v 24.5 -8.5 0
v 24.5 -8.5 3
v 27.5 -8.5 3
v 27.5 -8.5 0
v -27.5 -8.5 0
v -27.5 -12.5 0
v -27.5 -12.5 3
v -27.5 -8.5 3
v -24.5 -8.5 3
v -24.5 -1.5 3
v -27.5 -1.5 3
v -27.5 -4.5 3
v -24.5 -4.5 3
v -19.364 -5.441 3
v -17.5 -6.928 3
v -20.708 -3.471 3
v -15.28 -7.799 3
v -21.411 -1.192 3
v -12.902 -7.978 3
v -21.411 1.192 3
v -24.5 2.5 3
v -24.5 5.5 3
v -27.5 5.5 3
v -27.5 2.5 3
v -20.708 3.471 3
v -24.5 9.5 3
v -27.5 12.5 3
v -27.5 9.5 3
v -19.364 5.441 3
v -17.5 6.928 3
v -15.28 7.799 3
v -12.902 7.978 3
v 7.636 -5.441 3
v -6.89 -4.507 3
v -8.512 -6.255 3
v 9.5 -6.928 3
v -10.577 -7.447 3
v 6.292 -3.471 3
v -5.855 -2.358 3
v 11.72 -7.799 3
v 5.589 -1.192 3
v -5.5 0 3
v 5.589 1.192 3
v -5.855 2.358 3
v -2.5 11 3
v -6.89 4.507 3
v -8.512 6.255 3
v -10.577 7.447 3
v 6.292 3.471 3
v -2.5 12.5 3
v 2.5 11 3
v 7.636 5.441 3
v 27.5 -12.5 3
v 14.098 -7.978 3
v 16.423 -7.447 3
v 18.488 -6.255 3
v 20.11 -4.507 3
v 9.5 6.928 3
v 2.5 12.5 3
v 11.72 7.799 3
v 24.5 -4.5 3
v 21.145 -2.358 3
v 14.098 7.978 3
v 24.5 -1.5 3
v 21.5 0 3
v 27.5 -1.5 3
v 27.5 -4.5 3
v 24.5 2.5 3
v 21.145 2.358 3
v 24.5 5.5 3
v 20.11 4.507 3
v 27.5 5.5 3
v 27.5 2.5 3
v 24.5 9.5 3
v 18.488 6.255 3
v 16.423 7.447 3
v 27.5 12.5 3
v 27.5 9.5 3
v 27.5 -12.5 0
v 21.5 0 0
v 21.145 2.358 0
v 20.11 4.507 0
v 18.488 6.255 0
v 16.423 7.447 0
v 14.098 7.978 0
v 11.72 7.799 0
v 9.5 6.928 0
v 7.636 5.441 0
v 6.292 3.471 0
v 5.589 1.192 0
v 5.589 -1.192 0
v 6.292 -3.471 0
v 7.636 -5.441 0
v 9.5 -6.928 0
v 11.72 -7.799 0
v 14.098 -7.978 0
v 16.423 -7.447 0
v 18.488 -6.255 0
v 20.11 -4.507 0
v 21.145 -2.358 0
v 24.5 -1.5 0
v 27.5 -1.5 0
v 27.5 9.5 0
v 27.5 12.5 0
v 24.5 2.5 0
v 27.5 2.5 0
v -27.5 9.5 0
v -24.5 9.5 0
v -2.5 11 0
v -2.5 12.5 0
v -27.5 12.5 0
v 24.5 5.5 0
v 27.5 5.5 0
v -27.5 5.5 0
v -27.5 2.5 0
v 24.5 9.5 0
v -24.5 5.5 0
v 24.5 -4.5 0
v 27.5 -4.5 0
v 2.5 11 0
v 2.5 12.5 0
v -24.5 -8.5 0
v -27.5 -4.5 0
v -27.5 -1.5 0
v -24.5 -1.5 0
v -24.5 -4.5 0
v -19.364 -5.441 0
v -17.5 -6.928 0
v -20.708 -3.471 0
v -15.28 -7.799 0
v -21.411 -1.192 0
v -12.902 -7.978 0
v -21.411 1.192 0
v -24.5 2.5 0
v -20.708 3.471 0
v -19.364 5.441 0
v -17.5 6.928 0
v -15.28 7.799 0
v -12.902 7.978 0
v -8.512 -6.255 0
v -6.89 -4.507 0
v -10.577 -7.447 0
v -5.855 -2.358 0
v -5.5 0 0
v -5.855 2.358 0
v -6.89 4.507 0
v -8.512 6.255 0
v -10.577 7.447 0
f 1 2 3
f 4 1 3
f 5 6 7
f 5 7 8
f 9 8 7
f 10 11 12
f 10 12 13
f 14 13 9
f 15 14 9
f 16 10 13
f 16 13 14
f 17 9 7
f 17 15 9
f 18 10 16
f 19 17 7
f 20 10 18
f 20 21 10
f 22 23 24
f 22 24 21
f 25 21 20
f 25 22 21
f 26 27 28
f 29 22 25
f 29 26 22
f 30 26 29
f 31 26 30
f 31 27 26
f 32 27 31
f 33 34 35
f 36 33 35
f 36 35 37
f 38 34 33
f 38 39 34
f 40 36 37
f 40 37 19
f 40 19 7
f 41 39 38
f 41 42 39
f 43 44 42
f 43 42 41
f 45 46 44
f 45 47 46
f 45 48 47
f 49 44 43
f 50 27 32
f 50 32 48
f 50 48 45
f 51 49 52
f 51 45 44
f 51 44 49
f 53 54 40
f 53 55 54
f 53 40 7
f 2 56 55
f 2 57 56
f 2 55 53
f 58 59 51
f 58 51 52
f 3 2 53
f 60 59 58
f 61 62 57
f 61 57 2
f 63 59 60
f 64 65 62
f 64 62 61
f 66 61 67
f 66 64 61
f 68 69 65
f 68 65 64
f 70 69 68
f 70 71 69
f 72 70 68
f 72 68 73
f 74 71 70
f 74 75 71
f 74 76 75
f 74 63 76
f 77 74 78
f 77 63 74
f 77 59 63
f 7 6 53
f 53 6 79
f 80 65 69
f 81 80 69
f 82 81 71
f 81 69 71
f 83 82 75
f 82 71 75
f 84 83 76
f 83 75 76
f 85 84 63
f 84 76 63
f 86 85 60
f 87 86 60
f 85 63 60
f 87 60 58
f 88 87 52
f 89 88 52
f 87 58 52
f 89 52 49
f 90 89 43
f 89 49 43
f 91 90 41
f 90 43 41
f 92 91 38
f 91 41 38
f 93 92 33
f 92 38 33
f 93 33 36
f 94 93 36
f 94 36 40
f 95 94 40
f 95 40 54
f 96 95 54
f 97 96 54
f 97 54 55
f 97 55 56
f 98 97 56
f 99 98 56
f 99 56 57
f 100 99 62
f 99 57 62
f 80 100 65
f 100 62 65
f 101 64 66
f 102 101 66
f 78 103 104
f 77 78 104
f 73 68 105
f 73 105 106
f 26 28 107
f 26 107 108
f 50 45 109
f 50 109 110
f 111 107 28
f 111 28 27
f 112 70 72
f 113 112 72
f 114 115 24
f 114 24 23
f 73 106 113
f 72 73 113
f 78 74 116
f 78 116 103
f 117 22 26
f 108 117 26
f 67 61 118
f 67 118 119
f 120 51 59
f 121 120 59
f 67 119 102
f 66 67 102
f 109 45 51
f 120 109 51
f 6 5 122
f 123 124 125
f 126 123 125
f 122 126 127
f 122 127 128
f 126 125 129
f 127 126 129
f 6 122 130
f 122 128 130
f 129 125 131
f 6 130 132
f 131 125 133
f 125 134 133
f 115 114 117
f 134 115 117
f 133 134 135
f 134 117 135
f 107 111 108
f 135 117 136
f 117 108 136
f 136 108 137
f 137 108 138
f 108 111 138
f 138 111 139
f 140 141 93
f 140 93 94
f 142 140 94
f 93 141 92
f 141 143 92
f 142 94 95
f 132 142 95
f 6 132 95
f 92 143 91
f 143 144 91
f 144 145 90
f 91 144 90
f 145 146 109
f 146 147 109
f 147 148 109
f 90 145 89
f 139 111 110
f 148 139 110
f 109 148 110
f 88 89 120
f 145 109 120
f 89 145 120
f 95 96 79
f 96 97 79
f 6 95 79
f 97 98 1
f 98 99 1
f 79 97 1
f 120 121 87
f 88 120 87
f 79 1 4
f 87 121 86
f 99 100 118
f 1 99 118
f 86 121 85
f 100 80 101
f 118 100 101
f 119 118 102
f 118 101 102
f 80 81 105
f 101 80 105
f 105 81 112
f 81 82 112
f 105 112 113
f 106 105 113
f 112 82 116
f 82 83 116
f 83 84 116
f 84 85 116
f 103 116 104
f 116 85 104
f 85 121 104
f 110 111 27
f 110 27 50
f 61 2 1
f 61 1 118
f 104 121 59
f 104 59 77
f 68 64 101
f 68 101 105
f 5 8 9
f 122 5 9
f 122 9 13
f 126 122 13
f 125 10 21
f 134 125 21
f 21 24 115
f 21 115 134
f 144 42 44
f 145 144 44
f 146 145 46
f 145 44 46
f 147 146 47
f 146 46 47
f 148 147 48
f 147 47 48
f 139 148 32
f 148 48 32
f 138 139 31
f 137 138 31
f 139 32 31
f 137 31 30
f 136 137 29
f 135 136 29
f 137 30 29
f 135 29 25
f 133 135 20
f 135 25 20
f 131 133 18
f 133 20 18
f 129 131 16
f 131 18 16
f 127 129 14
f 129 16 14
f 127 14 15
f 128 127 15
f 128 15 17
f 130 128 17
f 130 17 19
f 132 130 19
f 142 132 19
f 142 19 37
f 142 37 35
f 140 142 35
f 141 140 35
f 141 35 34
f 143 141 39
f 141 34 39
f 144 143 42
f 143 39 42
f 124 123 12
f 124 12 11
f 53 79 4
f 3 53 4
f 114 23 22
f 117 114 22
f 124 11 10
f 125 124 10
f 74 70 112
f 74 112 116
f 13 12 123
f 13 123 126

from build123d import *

# Parameters (mm, degrees)
SKETCH1_W           = 55
SKETCH1_H           = 25
BOSS_EXTRUDE1_DEPTH = 3
SKETCH2_R           = 8
CUT_EXTRUDE1_DEPTH  = 3
SKETCH3_W           = 3
SKETCH3_H           = 4
CUT_EXTRUDE2_DEPTH  = 3
SKETCH4_W           = 3
SKETCH4_H           = 4
CUT_EXTRUDE3_DEPTH  = 3
SKETCH5_W           = 5
SKETCH5_H           = 1.5
CUT_EXTRUDE4_DEPTH  = 10


with BuildPart() as part:
    # Sketch1 → Boss-Extrude1 (new body)
    with BuildSketch(Plane.XY):
        Rectangle(SKETCH1_W, SKETCH1_H)
    extrude(amount=BOSS_EXTRUDE1_DEPTH)

    # Sketch2 → Cut-Extrude1 (cut)
    with BuildSketch(Plane.XY.offset(3)):
        with Locations((-13.5, 0)):
            Circle(SKETCH2_R)
        with Locations((13.5, 0)):
            Circle(SKETCH2_R)
    extrude(amount=-CUT_EXTRUDE1_DEPTH, mode=Mode.SUBTRACT)

    # Sketch3 → Cut-Extrude2 (cut)
    with BuildSketch(Plane.XY.offset(3)):
        with Locations((-26, 7.5)):
            Rectangle(SKETCH3_W, SKETCH3_H)
        with Locations((-26, 0.5)):
            Rectangle(SKETCH3_W, SKETCH3_H)
        with Locations((-26, -6.5)):
            Rectangle(SKETCH3_W, SKETCH3_H)
    extrude(amount=-CUT_EXTRUDE2_DEPTH, mode=Mode.SUBTRACT)

    # Sketch4 → Cut-Extrude3 (cut)
    with BuildSketch(Plane.XY.offset(3)):
        with Locations((26, 7.5)):
            Rectangle(SKETCH4_W, SKETCH4_H)
        with Locations((26, 0.5)):
            Rectangle(SKETCH4_W, SKETCH4_H)
        with Locations((26, -6.5)):
            Rectangle(SKETCH4_W, SKETCH4_H)
    extrude(amount=-CUT_EXTRUDE3_DEPTH, mode=Mode.SUBTRACT)

    # Sketch5 → Cut-Extrude4 (cut)
    with BuildSketch(Plane.XY.offset(3)):
        with Locations((0, 11.75)):
            Rectangle(SKETCH5_W, SKETCH5_H)
    extrude(amount=-CUT_EXTRUDE4_DEPTH, mode=Mode.SUBTRACT)


solid = part.part
